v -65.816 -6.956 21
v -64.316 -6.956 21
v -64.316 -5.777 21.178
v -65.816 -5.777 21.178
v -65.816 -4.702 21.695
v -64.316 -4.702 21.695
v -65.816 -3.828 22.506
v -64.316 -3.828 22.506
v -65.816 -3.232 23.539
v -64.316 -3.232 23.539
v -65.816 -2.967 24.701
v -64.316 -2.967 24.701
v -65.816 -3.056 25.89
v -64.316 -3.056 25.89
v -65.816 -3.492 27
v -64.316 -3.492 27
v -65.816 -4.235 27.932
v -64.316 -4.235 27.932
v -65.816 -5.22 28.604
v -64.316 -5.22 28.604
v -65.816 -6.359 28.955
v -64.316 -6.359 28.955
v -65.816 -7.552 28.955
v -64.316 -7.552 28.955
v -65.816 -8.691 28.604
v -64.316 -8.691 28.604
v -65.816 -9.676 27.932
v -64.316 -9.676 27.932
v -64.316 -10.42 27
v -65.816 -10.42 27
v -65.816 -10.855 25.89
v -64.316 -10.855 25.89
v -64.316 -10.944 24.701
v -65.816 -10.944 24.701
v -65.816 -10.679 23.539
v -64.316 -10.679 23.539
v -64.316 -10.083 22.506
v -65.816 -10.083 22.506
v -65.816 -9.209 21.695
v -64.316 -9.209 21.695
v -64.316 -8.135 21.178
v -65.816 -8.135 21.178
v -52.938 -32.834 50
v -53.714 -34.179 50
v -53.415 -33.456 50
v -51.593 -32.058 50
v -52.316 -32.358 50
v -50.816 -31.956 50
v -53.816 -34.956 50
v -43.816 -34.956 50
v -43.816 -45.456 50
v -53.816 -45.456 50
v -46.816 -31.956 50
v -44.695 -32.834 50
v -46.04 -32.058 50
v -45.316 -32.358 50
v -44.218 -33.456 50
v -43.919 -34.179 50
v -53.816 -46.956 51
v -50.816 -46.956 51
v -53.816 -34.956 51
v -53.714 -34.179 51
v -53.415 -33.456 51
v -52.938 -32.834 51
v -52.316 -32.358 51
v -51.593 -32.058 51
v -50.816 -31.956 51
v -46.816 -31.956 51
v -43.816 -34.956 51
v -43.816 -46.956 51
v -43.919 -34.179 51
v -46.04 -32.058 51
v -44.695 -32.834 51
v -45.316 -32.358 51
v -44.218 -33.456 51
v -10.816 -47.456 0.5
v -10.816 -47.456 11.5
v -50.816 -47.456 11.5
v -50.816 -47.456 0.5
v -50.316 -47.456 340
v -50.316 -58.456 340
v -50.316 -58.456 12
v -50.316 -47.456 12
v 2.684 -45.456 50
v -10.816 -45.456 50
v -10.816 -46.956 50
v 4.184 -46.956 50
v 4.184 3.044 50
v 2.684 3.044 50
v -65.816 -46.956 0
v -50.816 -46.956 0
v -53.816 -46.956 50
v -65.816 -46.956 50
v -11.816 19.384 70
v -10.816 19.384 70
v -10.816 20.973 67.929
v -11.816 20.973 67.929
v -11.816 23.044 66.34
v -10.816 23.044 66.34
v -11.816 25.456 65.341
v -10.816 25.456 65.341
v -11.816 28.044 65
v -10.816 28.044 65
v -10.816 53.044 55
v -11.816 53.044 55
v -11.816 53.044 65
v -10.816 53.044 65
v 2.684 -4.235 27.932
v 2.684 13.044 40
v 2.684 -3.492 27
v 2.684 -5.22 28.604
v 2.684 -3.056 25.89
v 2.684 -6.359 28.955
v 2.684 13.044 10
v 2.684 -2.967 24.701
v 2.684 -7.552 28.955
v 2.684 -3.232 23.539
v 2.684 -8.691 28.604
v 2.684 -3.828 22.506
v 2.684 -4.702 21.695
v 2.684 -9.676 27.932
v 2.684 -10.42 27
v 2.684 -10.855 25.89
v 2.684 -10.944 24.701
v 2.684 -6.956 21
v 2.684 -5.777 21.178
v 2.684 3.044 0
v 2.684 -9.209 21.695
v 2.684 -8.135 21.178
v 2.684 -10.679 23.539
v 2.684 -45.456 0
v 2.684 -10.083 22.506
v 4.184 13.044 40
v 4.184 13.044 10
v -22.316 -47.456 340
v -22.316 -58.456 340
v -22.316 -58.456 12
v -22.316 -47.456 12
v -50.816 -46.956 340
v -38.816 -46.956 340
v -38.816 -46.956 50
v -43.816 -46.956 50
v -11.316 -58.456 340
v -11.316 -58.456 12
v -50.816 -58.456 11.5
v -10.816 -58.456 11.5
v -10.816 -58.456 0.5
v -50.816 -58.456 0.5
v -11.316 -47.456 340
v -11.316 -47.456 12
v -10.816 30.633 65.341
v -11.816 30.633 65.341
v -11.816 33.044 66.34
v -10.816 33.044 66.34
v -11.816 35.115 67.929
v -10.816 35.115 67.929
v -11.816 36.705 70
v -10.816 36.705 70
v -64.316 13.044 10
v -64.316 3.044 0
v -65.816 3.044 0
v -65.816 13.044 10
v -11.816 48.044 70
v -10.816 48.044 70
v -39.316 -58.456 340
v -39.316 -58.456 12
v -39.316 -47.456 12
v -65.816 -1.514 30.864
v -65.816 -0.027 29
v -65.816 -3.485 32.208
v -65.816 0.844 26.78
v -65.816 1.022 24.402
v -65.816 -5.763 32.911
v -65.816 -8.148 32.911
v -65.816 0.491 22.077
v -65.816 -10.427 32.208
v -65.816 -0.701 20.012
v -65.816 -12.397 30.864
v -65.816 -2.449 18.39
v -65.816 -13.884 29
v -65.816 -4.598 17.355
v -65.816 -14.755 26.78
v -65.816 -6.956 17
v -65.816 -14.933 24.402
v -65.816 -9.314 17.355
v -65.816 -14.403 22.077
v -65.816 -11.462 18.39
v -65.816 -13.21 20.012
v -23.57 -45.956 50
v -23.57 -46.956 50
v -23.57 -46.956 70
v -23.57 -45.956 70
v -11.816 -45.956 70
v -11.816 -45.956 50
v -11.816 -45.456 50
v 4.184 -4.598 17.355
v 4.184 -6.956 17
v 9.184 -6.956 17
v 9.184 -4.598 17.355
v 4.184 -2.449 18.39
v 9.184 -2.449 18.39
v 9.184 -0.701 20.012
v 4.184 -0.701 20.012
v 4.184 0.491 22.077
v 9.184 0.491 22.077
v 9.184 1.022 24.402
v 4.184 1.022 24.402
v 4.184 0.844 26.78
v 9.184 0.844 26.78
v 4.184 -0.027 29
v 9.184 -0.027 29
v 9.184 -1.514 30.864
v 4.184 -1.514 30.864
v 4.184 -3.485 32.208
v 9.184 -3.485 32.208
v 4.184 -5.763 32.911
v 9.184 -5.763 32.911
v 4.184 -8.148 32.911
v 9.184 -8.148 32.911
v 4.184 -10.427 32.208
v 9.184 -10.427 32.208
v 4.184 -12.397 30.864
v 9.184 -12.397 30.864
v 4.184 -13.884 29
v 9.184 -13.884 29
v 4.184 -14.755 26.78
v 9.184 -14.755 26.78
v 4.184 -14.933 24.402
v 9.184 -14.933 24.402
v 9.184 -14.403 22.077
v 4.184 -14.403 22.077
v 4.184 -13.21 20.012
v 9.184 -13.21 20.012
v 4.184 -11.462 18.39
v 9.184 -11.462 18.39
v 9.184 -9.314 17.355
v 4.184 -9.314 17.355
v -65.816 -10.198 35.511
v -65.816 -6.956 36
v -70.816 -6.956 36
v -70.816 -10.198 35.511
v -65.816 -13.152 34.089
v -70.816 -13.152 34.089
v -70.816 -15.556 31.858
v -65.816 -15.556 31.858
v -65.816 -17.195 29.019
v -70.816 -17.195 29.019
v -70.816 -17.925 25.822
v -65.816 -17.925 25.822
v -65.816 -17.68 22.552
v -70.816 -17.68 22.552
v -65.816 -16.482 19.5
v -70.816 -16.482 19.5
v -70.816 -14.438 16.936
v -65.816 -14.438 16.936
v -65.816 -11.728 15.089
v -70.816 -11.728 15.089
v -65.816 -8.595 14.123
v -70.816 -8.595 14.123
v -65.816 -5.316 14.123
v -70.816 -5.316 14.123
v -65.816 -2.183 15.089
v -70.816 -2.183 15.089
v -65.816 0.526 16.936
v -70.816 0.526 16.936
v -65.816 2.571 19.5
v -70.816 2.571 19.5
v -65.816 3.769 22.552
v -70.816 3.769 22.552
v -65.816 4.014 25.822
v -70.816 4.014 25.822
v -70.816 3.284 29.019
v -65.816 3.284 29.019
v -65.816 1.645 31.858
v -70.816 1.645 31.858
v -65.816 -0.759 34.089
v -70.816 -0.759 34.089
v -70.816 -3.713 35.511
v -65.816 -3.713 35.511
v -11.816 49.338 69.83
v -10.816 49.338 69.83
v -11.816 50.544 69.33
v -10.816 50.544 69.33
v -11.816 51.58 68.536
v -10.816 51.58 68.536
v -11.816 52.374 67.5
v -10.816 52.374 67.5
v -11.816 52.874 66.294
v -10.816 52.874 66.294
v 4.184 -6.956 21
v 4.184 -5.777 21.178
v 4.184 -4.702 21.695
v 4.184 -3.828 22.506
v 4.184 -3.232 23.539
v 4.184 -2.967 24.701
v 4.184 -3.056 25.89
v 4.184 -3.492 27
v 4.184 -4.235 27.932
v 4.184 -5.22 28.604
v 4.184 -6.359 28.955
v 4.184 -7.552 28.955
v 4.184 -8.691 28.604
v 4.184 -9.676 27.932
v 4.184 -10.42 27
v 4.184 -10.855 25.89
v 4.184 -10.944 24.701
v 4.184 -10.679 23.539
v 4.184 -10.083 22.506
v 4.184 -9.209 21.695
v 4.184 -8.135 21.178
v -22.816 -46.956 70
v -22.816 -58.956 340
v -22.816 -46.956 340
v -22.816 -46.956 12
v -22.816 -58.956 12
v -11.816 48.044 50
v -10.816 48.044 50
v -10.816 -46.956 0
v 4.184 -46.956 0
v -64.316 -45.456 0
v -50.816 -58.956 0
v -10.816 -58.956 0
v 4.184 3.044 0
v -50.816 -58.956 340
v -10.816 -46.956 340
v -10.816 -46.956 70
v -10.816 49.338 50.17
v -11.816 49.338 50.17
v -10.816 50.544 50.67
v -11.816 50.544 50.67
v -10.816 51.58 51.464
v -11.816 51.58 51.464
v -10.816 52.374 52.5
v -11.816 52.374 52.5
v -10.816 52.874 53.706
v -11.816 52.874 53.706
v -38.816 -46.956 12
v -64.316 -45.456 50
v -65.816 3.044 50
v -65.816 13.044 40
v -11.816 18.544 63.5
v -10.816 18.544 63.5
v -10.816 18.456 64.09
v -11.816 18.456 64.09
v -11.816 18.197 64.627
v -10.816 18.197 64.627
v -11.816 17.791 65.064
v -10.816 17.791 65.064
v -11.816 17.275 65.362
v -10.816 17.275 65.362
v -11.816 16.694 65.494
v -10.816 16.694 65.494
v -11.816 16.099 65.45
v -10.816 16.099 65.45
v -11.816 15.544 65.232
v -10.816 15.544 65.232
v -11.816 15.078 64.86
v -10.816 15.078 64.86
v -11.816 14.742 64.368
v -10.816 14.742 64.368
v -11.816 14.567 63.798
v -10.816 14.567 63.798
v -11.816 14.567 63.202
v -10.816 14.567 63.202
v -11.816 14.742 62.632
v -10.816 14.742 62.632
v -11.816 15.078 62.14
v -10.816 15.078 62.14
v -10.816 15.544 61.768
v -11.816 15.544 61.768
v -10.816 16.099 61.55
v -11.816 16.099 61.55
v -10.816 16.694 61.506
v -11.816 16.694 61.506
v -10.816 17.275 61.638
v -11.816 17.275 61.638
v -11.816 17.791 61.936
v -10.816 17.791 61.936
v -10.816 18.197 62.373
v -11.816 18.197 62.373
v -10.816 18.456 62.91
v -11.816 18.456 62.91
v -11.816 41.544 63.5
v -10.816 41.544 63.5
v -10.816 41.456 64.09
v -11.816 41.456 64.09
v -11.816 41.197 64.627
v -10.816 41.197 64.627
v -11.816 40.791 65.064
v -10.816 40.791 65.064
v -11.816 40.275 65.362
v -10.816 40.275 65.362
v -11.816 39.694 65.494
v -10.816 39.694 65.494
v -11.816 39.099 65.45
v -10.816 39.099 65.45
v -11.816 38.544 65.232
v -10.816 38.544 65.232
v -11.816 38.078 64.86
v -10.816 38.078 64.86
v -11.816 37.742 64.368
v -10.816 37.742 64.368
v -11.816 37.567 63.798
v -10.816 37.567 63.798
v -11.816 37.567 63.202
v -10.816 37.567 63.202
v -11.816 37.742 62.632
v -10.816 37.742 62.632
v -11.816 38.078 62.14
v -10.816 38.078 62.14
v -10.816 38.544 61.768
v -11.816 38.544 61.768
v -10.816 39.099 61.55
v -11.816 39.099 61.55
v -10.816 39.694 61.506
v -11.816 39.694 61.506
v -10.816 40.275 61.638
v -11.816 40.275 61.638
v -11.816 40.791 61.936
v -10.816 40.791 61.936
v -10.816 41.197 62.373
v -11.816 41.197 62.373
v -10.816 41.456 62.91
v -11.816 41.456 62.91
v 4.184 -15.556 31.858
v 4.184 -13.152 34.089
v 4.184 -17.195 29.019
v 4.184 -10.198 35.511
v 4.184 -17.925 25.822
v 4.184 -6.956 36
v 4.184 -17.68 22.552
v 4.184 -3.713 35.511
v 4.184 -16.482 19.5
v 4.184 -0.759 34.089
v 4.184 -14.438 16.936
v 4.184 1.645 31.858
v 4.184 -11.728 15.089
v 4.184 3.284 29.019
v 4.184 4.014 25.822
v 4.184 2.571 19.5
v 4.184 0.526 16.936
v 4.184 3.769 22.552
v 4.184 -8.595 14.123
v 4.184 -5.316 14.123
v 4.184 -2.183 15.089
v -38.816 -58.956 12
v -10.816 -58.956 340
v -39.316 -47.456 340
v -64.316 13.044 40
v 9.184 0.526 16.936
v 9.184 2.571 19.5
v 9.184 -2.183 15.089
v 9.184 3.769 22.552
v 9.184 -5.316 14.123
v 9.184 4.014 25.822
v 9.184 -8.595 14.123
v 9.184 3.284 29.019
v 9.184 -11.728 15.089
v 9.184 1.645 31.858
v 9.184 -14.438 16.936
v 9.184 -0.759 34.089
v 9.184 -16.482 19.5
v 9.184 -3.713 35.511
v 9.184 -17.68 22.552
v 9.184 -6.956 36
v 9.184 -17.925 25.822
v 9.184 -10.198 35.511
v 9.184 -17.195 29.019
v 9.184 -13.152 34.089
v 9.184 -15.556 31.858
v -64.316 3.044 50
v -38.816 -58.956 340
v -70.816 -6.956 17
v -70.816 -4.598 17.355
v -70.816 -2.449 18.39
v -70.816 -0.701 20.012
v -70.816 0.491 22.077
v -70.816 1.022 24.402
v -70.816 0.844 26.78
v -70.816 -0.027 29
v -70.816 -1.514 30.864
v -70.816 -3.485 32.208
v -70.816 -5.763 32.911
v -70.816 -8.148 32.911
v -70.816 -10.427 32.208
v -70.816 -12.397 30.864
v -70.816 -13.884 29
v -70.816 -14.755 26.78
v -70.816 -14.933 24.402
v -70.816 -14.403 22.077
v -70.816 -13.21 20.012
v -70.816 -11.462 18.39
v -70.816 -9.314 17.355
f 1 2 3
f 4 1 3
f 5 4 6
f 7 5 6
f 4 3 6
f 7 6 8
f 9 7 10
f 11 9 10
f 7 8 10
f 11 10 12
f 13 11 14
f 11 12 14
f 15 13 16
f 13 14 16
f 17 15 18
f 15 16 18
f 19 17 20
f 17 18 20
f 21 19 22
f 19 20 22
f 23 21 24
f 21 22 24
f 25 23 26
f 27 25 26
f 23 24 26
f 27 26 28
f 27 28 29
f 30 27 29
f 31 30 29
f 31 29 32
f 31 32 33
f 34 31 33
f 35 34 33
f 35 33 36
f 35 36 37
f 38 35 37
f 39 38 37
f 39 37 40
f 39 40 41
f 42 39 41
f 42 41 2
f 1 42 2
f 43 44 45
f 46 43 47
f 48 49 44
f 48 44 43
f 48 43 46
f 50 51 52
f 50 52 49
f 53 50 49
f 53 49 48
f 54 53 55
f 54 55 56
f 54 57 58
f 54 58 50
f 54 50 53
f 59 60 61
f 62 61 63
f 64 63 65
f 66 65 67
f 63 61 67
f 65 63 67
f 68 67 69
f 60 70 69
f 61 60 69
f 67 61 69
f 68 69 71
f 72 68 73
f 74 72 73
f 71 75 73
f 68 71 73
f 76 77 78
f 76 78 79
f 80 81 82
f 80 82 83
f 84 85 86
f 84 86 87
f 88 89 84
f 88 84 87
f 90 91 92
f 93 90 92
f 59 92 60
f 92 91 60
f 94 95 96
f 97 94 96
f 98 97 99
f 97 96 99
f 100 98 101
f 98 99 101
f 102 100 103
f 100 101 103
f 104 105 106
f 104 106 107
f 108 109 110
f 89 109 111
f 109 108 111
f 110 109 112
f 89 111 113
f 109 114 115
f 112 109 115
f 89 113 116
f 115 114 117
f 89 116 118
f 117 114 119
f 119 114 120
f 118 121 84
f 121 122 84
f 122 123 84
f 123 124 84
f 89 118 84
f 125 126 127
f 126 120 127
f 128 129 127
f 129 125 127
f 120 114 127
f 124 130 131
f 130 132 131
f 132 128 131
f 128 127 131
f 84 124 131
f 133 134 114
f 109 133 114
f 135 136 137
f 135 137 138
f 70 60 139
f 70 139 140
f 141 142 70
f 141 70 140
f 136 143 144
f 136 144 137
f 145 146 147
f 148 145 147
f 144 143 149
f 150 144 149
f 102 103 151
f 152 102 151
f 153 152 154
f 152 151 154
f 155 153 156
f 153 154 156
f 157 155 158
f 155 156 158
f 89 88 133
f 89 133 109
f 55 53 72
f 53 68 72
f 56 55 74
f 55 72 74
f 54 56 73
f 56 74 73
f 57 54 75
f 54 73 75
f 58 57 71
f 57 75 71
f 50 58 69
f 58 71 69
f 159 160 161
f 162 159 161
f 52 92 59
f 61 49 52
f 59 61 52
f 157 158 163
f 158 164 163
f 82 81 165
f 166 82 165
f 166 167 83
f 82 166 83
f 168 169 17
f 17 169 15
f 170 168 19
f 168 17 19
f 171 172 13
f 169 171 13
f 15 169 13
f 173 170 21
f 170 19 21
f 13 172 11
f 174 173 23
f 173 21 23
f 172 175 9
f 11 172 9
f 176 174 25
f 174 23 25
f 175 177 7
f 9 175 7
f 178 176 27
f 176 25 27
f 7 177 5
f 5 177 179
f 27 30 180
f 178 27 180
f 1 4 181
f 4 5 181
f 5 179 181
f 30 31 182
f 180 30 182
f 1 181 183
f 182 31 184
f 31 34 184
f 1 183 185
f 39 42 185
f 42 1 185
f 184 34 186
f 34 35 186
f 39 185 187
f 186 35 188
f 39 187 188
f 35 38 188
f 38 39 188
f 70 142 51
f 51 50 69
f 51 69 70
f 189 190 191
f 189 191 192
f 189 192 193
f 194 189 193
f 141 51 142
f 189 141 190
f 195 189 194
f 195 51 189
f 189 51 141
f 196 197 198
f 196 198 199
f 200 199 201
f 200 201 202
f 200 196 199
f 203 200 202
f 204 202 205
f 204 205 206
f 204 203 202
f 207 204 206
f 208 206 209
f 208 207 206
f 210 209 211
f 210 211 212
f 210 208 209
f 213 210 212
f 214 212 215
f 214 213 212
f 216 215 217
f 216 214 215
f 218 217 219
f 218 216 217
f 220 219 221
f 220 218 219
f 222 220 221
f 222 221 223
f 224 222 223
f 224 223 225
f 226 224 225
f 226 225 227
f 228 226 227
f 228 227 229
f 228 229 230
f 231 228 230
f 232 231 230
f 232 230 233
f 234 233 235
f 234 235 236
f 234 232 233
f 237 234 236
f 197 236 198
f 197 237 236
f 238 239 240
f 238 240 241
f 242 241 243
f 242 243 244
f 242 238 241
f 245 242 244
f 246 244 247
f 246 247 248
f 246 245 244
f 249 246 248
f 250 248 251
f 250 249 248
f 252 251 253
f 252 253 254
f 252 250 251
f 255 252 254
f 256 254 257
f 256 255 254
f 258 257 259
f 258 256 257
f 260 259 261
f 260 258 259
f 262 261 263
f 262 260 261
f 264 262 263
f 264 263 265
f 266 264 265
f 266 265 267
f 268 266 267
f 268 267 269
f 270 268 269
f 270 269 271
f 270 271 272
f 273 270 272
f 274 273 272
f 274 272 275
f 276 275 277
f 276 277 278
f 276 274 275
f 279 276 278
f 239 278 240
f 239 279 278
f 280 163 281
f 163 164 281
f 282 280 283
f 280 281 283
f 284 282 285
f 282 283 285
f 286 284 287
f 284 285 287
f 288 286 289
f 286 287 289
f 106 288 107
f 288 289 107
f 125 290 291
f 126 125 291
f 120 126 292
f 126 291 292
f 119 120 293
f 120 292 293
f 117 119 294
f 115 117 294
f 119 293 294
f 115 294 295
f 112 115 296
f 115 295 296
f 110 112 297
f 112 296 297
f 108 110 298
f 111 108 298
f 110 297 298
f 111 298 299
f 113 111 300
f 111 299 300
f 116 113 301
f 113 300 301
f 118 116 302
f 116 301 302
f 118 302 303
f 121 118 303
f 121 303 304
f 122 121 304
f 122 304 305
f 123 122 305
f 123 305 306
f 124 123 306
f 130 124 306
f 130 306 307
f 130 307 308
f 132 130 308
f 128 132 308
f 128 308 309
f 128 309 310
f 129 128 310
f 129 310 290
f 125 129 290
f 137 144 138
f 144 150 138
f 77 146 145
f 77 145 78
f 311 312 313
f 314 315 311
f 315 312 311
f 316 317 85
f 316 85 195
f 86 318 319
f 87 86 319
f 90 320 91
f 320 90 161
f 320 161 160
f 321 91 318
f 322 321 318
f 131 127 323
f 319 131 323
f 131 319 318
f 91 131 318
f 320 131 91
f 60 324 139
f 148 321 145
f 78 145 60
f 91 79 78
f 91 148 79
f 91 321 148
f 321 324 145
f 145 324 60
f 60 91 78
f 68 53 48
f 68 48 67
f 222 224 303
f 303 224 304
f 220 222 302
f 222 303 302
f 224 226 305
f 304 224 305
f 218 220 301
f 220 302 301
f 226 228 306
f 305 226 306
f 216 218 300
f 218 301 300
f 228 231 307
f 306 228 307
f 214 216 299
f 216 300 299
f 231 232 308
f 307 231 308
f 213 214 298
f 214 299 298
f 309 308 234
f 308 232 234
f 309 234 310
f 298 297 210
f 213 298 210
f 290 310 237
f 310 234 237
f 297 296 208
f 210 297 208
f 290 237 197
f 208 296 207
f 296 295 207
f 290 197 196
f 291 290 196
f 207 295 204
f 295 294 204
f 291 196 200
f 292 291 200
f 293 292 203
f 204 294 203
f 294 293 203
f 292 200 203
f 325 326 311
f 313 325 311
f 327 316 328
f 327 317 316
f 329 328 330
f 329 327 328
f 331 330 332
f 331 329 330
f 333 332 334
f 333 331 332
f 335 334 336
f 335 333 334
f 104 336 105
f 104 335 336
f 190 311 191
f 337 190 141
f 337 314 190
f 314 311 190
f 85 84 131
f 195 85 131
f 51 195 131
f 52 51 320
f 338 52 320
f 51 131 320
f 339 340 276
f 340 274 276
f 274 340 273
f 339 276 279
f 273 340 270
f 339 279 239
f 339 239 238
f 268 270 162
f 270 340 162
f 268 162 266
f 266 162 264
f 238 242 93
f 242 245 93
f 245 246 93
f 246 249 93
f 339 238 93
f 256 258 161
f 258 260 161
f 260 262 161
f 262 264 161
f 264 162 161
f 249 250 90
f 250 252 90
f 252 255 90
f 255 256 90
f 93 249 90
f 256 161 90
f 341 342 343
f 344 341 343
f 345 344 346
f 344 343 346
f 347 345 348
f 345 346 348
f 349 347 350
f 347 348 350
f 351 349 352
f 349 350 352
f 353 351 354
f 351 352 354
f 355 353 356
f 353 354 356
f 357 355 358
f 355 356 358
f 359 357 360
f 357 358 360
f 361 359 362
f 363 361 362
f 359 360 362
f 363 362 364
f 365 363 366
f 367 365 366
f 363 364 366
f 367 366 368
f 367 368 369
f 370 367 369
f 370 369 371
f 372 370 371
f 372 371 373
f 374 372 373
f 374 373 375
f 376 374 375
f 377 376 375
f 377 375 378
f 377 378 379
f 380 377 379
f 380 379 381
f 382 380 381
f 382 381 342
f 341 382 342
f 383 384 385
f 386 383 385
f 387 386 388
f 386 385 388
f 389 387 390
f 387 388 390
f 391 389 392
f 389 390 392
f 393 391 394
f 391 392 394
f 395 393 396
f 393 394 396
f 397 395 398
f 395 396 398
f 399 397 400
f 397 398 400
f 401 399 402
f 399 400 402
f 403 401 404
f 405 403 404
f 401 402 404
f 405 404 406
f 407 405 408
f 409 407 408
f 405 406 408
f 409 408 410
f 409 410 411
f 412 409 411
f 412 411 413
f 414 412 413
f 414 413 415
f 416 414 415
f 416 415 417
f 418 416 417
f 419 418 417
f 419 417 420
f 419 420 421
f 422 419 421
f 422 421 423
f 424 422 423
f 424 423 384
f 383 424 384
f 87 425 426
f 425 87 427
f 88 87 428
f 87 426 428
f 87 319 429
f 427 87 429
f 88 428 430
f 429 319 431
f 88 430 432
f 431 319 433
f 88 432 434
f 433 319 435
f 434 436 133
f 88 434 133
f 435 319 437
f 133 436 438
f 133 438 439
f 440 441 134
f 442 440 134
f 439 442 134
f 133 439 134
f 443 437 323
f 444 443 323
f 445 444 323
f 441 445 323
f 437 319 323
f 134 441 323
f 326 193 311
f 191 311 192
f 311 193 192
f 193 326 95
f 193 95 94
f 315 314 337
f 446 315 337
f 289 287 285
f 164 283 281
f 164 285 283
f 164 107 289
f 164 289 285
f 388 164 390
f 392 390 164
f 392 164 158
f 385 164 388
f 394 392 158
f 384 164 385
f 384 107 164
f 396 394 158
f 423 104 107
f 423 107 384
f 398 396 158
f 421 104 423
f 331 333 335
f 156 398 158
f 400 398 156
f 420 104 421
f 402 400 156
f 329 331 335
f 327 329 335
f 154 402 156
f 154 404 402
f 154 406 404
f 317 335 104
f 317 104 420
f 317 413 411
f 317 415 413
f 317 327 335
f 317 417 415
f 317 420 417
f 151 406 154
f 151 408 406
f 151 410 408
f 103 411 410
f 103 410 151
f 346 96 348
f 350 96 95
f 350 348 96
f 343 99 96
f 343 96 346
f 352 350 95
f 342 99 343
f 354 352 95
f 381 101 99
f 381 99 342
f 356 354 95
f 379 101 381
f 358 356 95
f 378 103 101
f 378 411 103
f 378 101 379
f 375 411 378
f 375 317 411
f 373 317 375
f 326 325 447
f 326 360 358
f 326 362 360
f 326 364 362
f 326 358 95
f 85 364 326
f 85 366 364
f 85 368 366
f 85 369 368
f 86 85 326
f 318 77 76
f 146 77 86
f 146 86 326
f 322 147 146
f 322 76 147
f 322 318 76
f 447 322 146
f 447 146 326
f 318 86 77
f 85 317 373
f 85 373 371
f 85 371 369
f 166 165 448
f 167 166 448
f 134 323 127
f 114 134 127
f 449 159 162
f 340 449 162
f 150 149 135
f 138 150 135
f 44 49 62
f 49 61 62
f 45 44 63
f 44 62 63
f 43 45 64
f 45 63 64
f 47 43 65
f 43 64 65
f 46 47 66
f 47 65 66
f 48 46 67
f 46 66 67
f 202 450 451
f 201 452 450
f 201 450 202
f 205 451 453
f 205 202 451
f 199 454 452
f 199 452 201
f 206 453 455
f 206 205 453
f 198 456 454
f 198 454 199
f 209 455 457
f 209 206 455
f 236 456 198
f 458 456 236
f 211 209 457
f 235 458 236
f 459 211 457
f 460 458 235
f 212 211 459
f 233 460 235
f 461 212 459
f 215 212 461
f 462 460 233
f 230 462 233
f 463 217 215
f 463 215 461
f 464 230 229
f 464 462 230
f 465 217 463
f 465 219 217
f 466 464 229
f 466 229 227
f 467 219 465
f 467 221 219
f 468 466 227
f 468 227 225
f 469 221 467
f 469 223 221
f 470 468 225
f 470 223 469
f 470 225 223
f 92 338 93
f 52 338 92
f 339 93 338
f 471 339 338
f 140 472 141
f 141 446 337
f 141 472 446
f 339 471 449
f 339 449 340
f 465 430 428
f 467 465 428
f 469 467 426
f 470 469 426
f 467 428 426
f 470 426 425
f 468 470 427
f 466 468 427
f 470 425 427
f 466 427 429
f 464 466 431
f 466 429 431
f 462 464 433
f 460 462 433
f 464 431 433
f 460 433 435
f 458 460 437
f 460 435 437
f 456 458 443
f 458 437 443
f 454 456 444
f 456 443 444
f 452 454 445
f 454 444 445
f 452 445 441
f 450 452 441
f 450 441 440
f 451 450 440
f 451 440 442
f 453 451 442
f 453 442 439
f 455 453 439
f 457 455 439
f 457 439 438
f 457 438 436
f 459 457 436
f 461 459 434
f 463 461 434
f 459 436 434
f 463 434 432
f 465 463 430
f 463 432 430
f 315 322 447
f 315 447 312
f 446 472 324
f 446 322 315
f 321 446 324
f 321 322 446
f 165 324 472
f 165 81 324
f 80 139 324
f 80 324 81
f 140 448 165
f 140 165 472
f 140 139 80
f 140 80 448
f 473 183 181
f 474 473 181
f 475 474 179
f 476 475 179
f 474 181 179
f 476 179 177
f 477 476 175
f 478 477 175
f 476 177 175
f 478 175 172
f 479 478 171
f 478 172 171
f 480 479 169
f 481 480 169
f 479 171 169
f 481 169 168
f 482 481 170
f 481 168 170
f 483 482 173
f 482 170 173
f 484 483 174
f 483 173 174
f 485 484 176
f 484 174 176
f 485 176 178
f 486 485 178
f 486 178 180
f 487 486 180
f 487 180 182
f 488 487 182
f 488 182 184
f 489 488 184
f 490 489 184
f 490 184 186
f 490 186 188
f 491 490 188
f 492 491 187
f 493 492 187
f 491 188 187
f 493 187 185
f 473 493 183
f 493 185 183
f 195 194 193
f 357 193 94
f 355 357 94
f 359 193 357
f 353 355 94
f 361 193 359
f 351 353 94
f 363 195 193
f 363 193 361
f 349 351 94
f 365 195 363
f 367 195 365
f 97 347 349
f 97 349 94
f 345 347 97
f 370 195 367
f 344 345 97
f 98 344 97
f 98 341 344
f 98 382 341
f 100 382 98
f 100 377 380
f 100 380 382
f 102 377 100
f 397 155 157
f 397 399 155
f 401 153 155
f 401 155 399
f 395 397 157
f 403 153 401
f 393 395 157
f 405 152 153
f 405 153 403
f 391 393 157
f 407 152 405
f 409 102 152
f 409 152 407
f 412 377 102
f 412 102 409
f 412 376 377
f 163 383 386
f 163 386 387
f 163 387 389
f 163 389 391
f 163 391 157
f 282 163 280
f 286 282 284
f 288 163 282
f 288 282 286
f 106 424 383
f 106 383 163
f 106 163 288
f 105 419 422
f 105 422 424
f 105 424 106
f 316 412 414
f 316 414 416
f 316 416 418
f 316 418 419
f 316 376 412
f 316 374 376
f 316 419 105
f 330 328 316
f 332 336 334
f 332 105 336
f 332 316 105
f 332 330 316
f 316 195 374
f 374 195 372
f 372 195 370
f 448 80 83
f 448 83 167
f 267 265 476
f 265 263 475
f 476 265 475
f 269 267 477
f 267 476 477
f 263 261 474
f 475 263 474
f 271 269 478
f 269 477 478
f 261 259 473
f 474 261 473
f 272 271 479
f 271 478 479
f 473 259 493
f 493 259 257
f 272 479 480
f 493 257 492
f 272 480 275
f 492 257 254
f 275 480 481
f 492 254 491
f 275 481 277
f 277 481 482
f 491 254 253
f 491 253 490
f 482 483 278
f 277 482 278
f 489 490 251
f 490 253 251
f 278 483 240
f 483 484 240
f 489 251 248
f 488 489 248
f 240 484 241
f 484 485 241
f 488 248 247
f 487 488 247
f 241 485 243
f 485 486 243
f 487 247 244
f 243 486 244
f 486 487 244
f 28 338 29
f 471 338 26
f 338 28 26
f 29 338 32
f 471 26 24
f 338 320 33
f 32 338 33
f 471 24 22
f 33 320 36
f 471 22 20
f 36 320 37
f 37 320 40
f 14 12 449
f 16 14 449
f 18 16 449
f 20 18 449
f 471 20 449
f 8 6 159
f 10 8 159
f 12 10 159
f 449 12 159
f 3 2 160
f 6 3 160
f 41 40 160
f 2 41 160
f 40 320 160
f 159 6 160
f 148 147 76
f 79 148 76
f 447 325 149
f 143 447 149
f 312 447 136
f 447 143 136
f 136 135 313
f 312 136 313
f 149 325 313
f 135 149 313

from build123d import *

# Parameters (mm, degrees)
BOSS_EXTRUDE1_DEPTH      = 50
CHAMFER1_SIZE            = 10
SKETCH2_R                = 4
CUT_EXTRUDE1_DEPTH       = 80
SKETCH3_R                = 11
SKETCH3_R_2              = 8
BOSS_EXTRUDE2_DEPTH      = 5
SKETCH4_W                = 12
SKETCH4_H                = 12
SKETCH4_W_2              = 11
SKETCH4_H_2              = 11
BOSS_EXTRUDE3_DEPTH      = 340
SKETCH5_W                = 40
SKETCH5_H                = 12
BOSS_EXTRUDE4_DEPTH      = 12
SKETCH6_W                = 11
SKETCH6_H                = 11
CUT_EXTRUDE2_DEPTH       = 67
BOSS_EXTRUDE5_DEPTH      = 20
FILLET1_R                = 5
SKETCH8_R                = 2
CUT_EXTRUDE3_DEPTH       = 20
BOSS_EXTRUDE6_DEPTH      = 3
BOSS_EXTRUDE6_DEPTH_BACK = 7
SKETCH9_W                = 1
SKETCH9_H                = 15
FILLET2_R                = 3


with BuildPart() as part:
    # Sketch1 → Boss-Extrude1 (new body)
    with BuildSketch(Plane.XY):
        Polygon((-65.816488176, 13.044356197), (-65.816488176, -46.955643803), (4.183511824, -46.955643803), (4.183511824, 13.044356197), (2.683511824, 13.044356197), (2.683511824, -45.455643803), (-64.316488176, -45.455643803), (-64.316488176, 13.044356197), align=None)
    extrude(amount=BOSS_EXTRUDE1_DEPTH)

    # Chamfer1
    chamfer1_edges = [part.edges().sort_by_distance(p)[0] for p in [
        (-65.066488176, 13.044356197, 0),
        (3.433511824, 13.044356197, 50),
        (-65.066488176, 13.044356197, 50),
        (3.433511824, 13.044356197, 0),
    ]]
    chamfer(chamfer1_edges, length=CHAMFER1_SIZE)

    # Sketch2 → Cut-Extrude1 (cut)
    with BuildSketch(Plane(origin=(4.183511824, 0, 0), x_dir=(0, 0, -1), z_dir=(1, 0, 0))):
        with Locations((-25, -6.955643803)):
            Circle(SKETCH2_R)
    extrude(amount=-CUT_EXTRUDE1_DEPTH, mode=Mode.SUBTRACT)

    # Sketch3 → Boss-Extrude2 (add)
    with BuildSketch(Plane(origin=(4.183511824, 0, 0), x_dir=(0, 0, -1), z_dir=(1, 0, 0))):
        with Locations(Location((-25, -6.955643803, 0), (0, 0, 180))):
            Circle(SKETCH3_R)
        with Locations((-25, -6.955643803)):
            Circle(SKETCH3_R_2, mode=Mode.SUBTRACT)
    boss_extrude2 = extrude(amount=BOSS_EXTRUDE2_DEPTH)

    # Mirror1: Boss-Extrude2 across plane
    add(boss_extrude2.mirror(Plane.ZY.offset(30.816488176)))

    # Sketch4 → Boss-Extrude3 (add)
    with BuildSketch(Plane(origin=(0, 0, 0), x_dir=(-1, 0, 0), z_dir=(0, 0, -1))):
        with Locations((16.816488176, -52.955643803)):
            Rectangle(SKETCH4_W, SKETCH4_H)
        with Locations((16.816488176, -52.955643803)):
            Rectangle(SKETCH4_W_2, SKETCH4_H_2, mode=Mode.SUBTRACT)
    boss_extrude3 = extrude(amount=-BOSS_EXTRUDE3_DEPTH)

    # Mirror2: Boss-Extrude3 across plane
    add(boss_extrude3.mirror(Plane.ZY.offset(30.816488176)))

    # Sketch5 → Boss-Extrude4 (add)
    with BuildSketch(Plane(origin=(0, 0, 0), x_dir=(-1, 0, 0), z_dir=(0, 0, -1))):
        with Locations((30.816488176, -52.955643803)):
            Rectangle(SKETCH5_W, SKETCH5_H)
    extrude(amount=-BOSS_EXTRUDE4_DEPTH)

    # Sketch6 → Cut-Extrude2 (cut)
    with BuildSketch(Plane(origin=(-10.816488176, 0, 0), x_dir=(0, 0, -1), z_dir=(1, 0, 0))):
        with Locations((-6, -52.955643803)):
            Rectangle(SKETCH6_W, SKETCH6_H)
    extrude(amount=-CUT_EXTRUDE2_DEPTH, mode=Mode.SUBTRACT)

    # Sketch7 → Boss-Extrude5 (add)
    with BuildSketch(Plane.XY.offset(50)):
        Polygon((-23.570169561, -45.955643803), (-11.816488176, -45.955643803), (-11.816488176, 53.044356197), (-10.816488176, 53.044356197), (-10.816488176, -46.955643803), (-23.570169561, -46.955643803), align=None)
    extrude(amount=BOSS_EXTRUDE5_DEPTH)

    # Fillet1
    fillet1_edges = [part.edges().sort_by_distance(p)[0] for p in [
        (-11.316488176, 53.044356197, 50),
        (-11.316488176, 53.044356197, 70),
    ]]
    fillet(fillet1_edges, radius=FILLET1_R)

    # Sketch8 → Cut-Extrude3 (cut)
    with BuildSketch(Plane(origin=(-10.816488176, 0, 0), x_dir=(0, 0, -1), z_dir=(1, 0, 0))):
        with Locations(Location((-63.5, 39.544356197, 0), (0, 0, 90))):
            Circle(SKETCH8_R)
        with BuildLine():
            Line((-70, 28.044356197), (-70, 19.384102159))
            ThreePointArc((-70, 19.384102159), (-66.339745962, 23.044356197), (-65, 28.044356197))
            ThreePointArc((-65, 28.044356197), (-66.339745962, 33.044356197), (-70, 36.704610234))
            Line((-70, 36.704610234), (-70, 28.044356197))
        make_face()
        with Locations(Location((-63.5, 16.544356197, 0), (0, 0, 90))):
            Circle(SKETCH8_R)
    extrude(amount=-CUT_EXTRUDE3_DEPTH, mode=Mode.SUBTRACT)

    # Sketch9 → Boss-Extrude6 (add, two sides: drawn at the far end of the back side and taken through both)
    with BuildSketch(Plane.ZY.offset(50.816488176).offset(-BOSS_EXTRUDE6_DEPTH_BACK)):
        with Locations((50.5, -39.455643803)):
            Rectangle(SKETCH9_W, SKETCH9_H)
    extrude(amount=BOSS_EXTRUDE6_DEPTH + BOSS_EXTRUDE6_DEPTH_BACK)

    # Fillet2
    fillet2_edges = [part.edges().sort_by_distance(p)[0] for p in [
        (-43.816488176, -31.955643803, 50.5),
        (-53.816488176, -31.955643803, 50.5),
    ]]
    fillet(fillet2_edges, radius=FILLET2_R)


solid = part.part
